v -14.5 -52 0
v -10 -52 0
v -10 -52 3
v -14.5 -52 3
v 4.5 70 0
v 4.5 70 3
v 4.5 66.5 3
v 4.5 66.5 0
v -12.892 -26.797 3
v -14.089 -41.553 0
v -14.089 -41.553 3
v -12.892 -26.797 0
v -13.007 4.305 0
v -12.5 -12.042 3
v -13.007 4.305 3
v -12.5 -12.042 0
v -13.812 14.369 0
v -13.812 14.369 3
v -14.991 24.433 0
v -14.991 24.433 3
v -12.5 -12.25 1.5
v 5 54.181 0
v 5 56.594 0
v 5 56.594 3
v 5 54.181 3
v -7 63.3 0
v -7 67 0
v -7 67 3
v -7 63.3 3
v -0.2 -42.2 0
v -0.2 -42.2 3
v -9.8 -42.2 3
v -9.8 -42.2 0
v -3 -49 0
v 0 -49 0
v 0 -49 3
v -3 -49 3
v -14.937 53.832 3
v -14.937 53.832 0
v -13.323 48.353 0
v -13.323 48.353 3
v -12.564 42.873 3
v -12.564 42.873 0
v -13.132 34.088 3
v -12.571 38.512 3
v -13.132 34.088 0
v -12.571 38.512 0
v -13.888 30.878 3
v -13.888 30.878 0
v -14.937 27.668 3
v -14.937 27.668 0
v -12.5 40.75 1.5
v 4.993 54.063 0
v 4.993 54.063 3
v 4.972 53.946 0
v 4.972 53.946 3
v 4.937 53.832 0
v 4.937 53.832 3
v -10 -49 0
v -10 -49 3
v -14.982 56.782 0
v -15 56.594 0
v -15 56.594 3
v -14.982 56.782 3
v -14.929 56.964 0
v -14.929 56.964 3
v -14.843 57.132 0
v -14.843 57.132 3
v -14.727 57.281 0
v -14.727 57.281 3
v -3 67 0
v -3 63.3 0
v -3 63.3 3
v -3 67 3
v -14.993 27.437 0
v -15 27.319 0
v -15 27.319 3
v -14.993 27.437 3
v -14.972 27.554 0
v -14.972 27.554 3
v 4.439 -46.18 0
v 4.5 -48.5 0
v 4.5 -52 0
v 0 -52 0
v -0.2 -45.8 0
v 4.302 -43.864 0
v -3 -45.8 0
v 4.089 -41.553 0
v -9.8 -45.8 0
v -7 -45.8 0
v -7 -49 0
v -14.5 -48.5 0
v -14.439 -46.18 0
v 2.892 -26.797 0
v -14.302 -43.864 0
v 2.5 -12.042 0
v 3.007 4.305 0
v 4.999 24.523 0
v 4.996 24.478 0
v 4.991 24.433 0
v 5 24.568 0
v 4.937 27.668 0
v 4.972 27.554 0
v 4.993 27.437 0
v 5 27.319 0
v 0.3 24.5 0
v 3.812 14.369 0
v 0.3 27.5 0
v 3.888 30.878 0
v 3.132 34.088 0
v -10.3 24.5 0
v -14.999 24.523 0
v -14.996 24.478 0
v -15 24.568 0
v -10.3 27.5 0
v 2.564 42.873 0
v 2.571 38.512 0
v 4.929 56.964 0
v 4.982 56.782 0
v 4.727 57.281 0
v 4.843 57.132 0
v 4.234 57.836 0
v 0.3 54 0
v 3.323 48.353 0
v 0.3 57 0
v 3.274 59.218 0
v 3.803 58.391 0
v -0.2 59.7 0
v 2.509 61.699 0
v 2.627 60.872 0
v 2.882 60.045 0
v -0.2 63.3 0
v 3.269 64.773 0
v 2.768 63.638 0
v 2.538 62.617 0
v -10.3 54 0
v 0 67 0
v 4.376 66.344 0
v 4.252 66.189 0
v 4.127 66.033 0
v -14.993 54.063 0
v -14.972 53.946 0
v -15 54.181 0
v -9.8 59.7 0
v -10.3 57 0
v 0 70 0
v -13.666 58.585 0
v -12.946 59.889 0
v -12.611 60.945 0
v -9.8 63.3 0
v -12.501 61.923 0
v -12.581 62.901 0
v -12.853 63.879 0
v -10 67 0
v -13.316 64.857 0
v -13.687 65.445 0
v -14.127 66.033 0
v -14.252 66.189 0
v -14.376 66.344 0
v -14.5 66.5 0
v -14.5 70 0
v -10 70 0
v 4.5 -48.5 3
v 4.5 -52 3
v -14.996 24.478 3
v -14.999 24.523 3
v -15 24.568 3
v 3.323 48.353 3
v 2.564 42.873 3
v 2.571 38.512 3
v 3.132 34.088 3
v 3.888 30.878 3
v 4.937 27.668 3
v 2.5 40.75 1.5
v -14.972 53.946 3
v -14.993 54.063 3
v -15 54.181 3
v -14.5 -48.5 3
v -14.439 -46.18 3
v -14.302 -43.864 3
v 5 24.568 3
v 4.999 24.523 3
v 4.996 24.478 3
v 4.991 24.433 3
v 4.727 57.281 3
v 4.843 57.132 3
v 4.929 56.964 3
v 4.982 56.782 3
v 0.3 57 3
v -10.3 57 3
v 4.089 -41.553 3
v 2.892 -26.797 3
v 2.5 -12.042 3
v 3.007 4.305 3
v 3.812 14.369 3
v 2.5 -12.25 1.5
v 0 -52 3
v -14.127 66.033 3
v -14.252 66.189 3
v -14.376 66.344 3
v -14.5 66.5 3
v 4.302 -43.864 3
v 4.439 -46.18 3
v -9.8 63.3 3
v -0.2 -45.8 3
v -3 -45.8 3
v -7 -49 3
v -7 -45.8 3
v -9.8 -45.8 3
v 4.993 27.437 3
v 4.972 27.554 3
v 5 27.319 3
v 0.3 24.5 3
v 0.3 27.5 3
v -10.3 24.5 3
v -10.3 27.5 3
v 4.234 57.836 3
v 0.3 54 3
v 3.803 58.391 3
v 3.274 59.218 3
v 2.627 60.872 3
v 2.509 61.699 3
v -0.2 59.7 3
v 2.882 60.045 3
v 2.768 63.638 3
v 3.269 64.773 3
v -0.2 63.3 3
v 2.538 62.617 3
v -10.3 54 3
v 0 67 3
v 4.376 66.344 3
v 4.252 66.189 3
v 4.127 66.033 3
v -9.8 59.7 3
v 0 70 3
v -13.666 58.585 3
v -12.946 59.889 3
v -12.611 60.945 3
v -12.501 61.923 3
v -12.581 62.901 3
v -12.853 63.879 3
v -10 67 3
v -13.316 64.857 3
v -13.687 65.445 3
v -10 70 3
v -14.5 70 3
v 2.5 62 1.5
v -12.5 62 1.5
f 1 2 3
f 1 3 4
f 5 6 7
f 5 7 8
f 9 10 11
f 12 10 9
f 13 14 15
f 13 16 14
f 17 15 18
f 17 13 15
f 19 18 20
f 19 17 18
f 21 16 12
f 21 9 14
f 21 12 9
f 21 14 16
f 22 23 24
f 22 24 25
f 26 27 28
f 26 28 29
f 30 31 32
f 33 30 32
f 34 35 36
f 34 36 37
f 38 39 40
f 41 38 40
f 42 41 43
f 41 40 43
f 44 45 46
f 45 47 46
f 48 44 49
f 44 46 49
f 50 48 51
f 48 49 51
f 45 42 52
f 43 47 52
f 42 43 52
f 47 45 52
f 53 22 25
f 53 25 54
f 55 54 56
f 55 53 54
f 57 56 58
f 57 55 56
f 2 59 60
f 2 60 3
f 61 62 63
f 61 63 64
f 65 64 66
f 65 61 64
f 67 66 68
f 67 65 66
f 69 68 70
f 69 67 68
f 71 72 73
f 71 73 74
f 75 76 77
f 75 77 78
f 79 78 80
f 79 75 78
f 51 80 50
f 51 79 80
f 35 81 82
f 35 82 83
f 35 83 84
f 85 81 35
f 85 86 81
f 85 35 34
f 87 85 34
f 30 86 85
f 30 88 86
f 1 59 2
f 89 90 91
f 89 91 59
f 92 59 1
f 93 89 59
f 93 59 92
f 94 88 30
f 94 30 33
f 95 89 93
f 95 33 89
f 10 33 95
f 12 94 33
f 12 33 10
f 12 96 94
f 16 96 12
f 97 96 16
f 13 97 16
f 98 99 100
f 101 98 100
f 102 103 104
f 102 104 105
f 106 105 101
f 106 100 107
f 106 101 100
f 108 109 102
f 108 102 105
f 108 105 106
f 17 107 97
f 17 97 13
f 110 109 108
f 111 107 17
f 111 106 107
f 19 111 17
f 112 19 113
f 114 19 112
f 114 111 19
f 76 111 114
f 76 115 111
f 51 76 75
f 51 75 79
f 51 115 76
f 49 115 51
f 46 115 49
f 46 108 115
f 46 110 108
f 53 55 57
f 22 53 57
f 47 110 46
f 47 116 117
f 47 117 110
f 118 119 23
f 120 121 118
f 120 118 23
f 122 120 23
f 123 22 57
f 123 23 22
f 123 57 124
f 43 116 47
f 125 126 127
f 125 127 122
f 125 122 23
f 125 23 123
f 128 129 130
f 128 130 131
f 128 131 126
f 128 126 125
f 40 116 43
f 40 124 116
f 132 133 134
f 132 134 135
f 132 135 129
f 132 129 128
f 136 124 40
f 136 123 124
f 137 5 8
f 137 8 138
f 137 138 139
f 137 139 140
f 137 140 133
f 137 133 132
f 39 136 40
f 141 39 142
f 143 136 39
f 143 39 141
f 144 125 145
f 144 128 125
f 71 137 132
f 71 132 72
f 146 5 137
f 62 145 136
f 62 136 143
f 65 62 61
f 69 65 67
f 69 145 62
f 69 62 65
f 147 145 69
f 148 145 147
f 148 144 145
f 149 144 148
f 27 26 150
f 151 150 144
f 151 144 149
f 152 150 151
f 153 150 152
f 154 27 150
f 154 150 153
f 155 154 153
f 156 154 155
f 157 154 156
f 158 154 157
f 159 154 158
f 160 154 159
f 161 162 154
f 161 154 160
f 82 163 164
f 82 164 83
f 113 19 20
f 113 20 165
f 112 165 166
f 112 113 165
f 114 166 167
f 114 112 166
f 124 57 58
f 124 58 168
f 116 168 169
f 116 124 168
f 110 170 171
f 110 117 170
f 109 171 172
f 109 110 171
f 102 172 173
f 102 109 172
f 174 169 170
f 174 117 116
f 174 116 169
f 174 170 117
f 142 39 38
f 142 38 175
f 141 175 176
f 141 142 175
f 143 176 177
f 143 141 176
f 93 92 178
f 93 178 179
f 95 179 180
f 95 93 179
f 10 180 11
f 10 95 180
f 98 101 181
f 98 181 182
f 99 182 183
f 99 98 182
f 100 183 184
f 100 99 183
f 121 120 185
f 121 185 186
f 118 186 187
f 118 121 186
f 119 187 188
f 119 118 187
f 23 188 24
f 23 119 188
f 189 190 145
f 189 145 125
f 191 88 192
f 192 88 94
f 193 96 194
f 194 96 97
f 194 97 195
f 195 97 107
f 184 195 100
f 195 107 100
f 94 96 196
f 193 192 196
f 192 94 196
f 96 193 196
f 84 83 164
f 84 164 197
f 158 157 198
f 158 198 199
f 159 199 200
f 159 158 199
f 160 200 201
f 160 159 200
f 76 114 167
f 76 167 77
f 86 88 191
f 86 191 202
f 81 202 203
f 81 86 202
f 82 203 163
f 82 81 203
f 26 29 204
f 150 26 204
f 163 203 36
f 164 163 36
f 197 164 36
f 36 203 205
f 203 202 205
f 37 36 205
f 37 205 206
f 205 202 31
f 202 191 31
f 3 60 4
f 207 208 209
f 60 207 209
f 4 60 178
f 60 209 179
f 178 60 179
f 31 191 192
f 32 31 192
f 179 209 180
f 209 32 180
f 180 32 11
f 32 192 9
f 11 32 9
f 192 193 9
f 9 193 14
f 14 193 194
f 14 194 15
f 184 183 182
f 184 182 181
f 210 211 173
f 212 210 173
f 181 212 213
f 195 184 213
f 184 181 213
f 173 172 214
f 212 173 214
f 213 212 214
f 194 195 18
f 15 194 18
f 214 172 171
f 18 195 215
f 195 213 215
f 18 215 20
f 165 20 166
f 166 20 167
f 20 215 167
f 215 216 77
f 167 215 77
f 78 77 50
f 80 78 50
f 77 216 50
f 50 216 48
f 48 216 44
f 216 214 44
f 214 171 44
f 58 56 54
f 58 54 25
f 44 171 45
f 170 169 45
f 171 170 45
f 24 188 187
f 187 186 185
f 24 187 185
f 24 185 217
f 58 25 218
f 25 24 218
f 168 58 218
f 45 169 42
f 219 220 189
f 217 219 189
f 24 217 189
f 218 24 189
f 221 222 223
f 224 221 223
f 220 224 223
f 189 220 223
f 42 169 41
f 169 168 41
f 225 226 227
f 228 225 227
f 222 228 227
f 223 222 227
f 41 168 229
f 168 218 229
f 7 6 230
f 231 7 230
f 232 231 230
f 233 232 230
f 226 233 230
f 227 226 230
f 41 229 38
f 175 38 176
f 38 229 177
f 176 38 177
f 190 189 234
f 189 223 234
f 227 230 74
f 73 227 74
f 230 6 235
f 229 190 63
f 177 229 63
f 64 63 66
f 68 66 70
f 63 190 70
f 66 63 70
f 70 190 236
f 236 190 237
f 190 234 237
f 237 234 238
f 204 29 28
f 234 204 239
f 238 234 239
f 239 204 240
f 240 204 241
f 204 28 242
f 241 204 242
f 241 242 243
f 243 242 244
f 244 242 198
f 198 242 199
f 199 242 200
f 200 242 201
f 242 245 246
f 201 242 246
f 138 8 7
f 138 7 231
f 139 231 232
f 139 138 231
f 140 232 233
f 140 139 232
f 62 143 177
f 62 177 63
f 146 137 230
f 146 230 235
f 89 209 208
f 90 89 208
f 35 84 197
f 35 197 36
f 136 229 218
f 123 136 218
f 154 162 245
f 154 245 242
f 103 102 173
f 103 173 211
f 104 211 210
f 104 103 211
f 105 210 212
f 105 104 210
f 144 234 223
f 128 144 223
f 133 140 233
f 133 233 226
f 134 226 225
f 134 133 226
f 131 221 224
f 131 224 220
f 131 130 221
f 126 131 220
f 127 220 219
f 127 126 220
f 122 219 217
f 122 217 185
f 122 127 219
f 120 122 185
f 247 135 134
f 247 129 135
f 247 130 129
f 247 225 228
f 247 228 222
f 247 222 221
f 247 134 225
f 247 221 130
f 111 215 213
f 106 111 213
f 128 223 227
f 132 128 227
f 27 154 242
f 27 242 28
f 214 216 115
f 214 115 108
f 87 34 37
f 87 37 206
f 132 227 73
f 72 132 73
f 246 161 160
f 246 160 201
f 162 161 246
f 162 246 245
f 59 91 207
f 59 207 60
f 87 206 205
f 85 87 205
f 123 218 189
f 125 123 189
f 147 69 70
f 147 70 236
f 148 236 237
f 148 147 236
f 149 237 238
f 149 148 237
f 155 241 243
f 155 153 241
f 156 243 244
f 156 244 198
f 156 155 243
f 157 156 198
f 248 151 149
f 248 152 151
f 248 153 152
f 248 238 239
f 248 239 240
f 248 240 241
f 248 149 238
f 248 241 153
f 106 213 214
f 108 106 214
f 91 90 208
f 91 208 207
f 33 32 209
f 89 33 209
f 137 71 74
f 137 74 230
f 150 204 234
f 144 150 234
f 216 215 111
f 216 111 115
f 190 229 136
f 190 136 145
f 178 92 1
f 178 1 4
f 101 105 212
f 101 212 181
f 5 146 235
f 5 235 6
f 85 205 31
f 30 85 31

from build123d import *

# Parameters (mm, degrees)
CROQUIS1_W              = 10
CROQUIS1_H              = 3
SALIENTE_EXTRUIR1_DEPTH = 3
CROQUIS2_W              = 0.3
CROQUIS2_H              = 0.3
CROQUIS2_H_2            = 3
CORTAR_EXTRUIR2_DEPTH   = 3
CROQUIS3_W              = 3
CROQUIS3_H              = 3.5
CORTAR_EXTRUIR3_DEPTH   = 0.5
CROQUIS4_W              = 3
CROQUIS4_H              = 3.5
CORTAR_EXTRUIR4_DEPTH   = 0.5
CROQUIS5_W              = 3
CROQUIS5_H              = 3.5
CORTAR_EXTRUIR5_DEPTH   = 0.5
CROQUIS6_W              = 3
CROQUIS6_H              = 3.5
CORTAR_EXTRUIR6_DEPTH   = 0.5
REDONDEO1_START         = -1
REDONDEO1_DEPTH         = 5


with BuildPart() as part:
    # Croquis1 → Saliente-Extruir1 (new body)
    with BuildSketch(Plane.XY):
        with BuildLine():
            Line((-10, 70), (-10, 67))
            Line((-10, 67), (-7, 67))
            Line((-7, 67), (-7, 63))
            Line((-7, 63), (-9.5, 63))
            Line((-9.5, 63), (-9.5, 60))
            Line((-9.5, 60), (-0.5, 60))
            Line((-0.5, 60), (-0.5, 63))
            Line((-0.5, 63), (-3, 63))
            Line((-3, 63), (-3, 67))
            Line((-3, 67), (0, 67))
            Line((0, 67), (0, 70))
            Line((0, 70), (5, 70))
            Line((5, 70), (5, 67.405747627))
            ThreePointArc((5, 67.405747627), (4.929306729, 67.036438809), (4.727221995, 66.719345288))
            add(Edge.make_bspline(
                [(4.727221995, 66.719345288), (3.242407332, 65.146230192), (1.757592668, 62), (3.242407332, 58.853769808), (4.727221995, 57.280654712)],
                knots=[0.028065471, 0.028065471, 0.028065471, 0.028065471, 0.5, 0.971934529, 0.971934529, 0.971934529, 0.971934529], degree=3))
            ThreePointArc((4.727221995, 57.280654712), (4.929306729, 56.963561191), (5, 56.594252373))
            Line((5, 56.594252373), (5, 54.181314171))
            ThreePointArc((5, 54.181314171), (4.9841425, 54.003934523), (4.937072921, 53.832180471))
            add(Edge.make_bspline(
                [(4.937072921, 53.832180471), (3.31235764, 49.471453647), (1.68764236, 40.75), (3.31235764, 32.028546353), (4.937072921, 27.667819529)],
                knots=[0.006332812, 0.006332812, 0.006332812, 0.006332812, 0.5, 0.993667188, 0.993667188, 0.993667188, 0.993667188], degree=3))
            ThreePointArc((4.937072921, 27.667819529), (4.9841425, 27.496065477), (5, 27.318685829))
            Line((5, 27.318685829), (5, 24.567654138))
            ThreePointArc((5, 24.567654138), (4.997723384, 24.500214919), (4.990903903, 24.433082766))
            add(Edge.make_bspline(
                [(4.990903903, -48.933082766), (3.330301301, -36.70538851), (1.669698699, -12.25), (3.330301301, 12.20538851), (4.990903903, 24.433082766)],
                knots=[0.000910439, 0.000910439, 0.000910439, 0.000910439, 0.5, 0.999089561, 0.999089561, 0.999089561, 0.999089561], degree=3))
            ThreePointArc((4.990903903, -48.933082766), (4.997723384, -49.000214919), (5, -49.067654138))
            Line((5, -49.067654138), (5, -51.701381229))
            Line((5, -51.701381229), (5, -52))
            Line((5, -52), (0, -52))
            Line((0, -52), (0, -49))
            Line((0, -49), (-3, -49))
            Line((-3, -49), (-3, -45.5))
            Line((-3, -45.5), (-0.5, -45.5))
            Line((-0.5, -45.5), (-0.5, -42.5))
            Line((-0.5, -42.5), (-9.5, -42.5))
            Line((-9.5, -42.5), (-9.5, -45.5))
            Line((-9.5, -45.5), (-7, -45.5))
            Line((-7, -45.5), (-7, -49))
            Line((-7, -49), (-10, -49))
            Line((-10, -49), (-10, -52))
            Line((-10, -52), (-15, -52))
            Line((-15, -52), (-15, -51.701381229))
            Line((-15, -51.701381229), (-15, -49.067654138))
            ThreePointArc((-15, -49.067654138), (-14.997723384, -49.000214919), (-14.990903903, -48.933082766))
            add(Edge.make_bspline(
                [(-14.990903903, -48.933082766), (-13.330301301, -36.70538851), (-11.669698699, -12.25), (-13.330301301, 12.20538851), (-14.990903903, 24.433082766)],
                knots=[0.000910439, 0.000910439, 0.000910439, 0.000910439, 0.5, 0.999089561, 0.999089561, 0.999089561, 0.999089561], degree=3))
            ThreePointArc((-14.990903903, 24.433082766), (-14.997723384, 24.500214919), (-15, 24.567654138))
            Line((-15, 24.567654138), (-15, 27.318685829))
            ThreePointArc((-15, 27.318685829), (-14.9841425, 27.496065477), (-14.937072921, 27.667819529))
            add(Edge.make_bspline(
                [(-14.937072921, 53.832180471), (-13.31235764, 49.471453647), (-11.68764236, 40.75), (-13.31235764, 32.028546353), (-14.937072921, 27.667819529)],
                knots=[0.006332812, 0.006332812, 0.006332812, 0.006332812, 0.5, 0.993667188, 0.993667188, 0.993667188, 0.993667188], degree=3))
            ThreePointArc((-14.937072921, 53.832180471), (-14.9841425, 54.003934523), (-15, 54.181314171))
            Line((-15, 54.181314171), (-15, 56.594252373))
            ThreePointArc((-15, 56.594252373), (-14.929306729, 56.963561191), (-14.727221995, 57.280654712))
            add(Edge.make_bspline(
                [(-14.727221995, 57.280654712), (-13.242407332, 58.853769808), (-11.757592668, 62), (-13.242407332, 65.146230192), (-14.727221995, 66.719345288)],
                knots=[0.028065471, 0.028065471, 0.028065471, 0.028065471, 0.5, 0.971934529, 0.971934529, 0.971934529, 0.971934529], degree=3))
            ThreePointArc((-14.727221995, 66.719345288), (-14.929306729, 67.036438809), (-15, 67.405747627))
            Line((-15, 67.405747627), (-15, 70))
            Line((-15, 70), (-10, 70))
        make_face()
        with Locations((-5, 26)):
            Rectangle(CROQUIS1_W, CROQUIS1_H, mode=Mode.SUBTRACT)
        with Locations((-5, 55.5)):
            Rectangle(CROQUIS1_W, CROQUIS1_H, mode=Mode.SUBTRACT)
    extrude(amount=SALIENTE_EXTRUIR1_DEPTH)

    # Croquis2 → Cortar-Extruir2 (cut)
    with BuildSketch(Plane.XY.offset(3)):
        Polygon((-9.8, -45.5), (-9.8, -45.8), (-9.5, -45.8), (-7, -45.8), (-7, -45.5), (-9.5, -45.5), (-9.5, -42.5), (-0.5, -42.5), (-0.5, -42.2), (-9.5, -42.2), (-9.8, -42.2), (-9.8, -42.5), align=None)
        Polygon((-0.5, -45.8), (-0.2, -45.8), (-0.2, -45.5), (-0.2, -42.5), (-0.5, -42.5), (-0.5, -45.5), (-3, -45.5), (-3, -45.8), align=None)
        with Locations((-0.35, -42.35)):
            Rectangle(CROQUIS2_W, CROQUIS2_H)
        with Locations((-10.15, 26)):
            Rectangle(CROQUIS2_W, CROQUIS2_H_2)
        with Locations((0.15, 26)):
            Rectangle(CROQUIS2_W, CROQUIS2_H_2)
        with Locations((0.15, 55.5)):
            Rectangle(CROQUIS2_W, CROQUIS2_H_2)
        with Locations((-10.15, 55.5)):
            Rectangle(CROQUIS2_W, CROQUIS2_H_2)
        Polygon((-9.8, 63.3), (-9.5, 63.3), (-7, 63.3), (-7, 63), (-9.5, 63), (-9.5, 60), (-0.5, 60), (-0.5, 63), (-3, 63), (-3, 63.3), (-0.5, 63.3), (-0.2, 63.3), (-0.2, 63), (-0.2, 60), (-0.2, 59.7), (-0.5, 59.7), (-9.5, 59.7), (-9.8, 59.7), (-9.8, 60), (-9.8, 63), align=None)
    extrude(amount=-CORTAR_EXTRUIR2_DEPTH, mode=Mode.SUBTRACT)

    # Croquis3 → Cortar-Extruir3 (cut)
    with BuildSketch(Plane.ZY.offset(15)):
        with Locations((1.5, -50.25)):
            Rectangle(CROQUIS3_W, CROQUIS3_H)
    extrude(amount=-CORTAR_EXTRUIR3_DEPTH, mode=Mode.SUBTRACT)

    # Croquis4 → Cortar-Extruir4 (cut)
    with BuildSketch(Plane(origin=(5, 0, 0), x_dir=(0, 0, -1), z_dir=(1, 0, 0))):
        with Locations((-1.5, -50.25)):
            Rectangle(CROQUIS4_W, CROQUIS4_H)
    extrude(amount=-CORTAR_EXTRUIR4_DEPTH, mode=Mode.SUBTRACT)

    # Croquis5 → Cortar-Extruir5 (cut)
    with BuildSketch(Plane.ZY.offset(15)):
        with Locations((1.5, 68.25)):
            Rectangle(CROQUIS5_W, CROQUIS5_H)
    extrude(amount=-CORTAR_EXTRUIR5_DEPTH, mode=Mode.SUBTRACT)

    # Croquis6 → Cortar-Extruir6 (cut)
    with BuildSketch(Plane(origin=(5, 0, 0), x_dir=(0, 0, -1), z_dir=(1, 0, 0))):
        with Locations((-1.5, 68.25)):
            Rectangle(CROQUIS6_W, CROQUIS6_H)
    extrude(amount=-CORTAR_EXTRUIR6_DEPTH, mode=Mode.SUBTRACT)

    # Redondeo1: read off the stored shape, not the designer's step
    # Redondeo1 outline → Redondeo1 (cut)
    with BuildSketch(Plane.XY.offset(REDONDEO1_START)):
        with BuildLine():
            Line((-14.932435559, -48.5), (-14.5, -48.5))
            ThreePointArc((-14.5, -48.5), (-14.379883961, -45.021273255), (-14.08941772, -41.552614006))
            add(Edge.make_bspline(
                [(-14.932435559, -48.5), (-14.621648088, -46.184204669), (-14.340642142, -43.868409337), (-14.08941772, -41.552614006)],
                knots=[0.006802721, 0.006802721, 0.006802721, 0.006802721, 0.10132498, 0.10132498, 0.10132498, 0.10132498], degree=3))
        make_face()
        with BuildLine():
            add(Edge.make_bspline(
                [(4.932435559, -48.5), (4.621648088, -46.184204669), (4.340642142, -43.868409337), (4.08941772, -41.552614006)],
                knots=[0.006802721, 0.006802721, 0.006802721, 0.006802721, 0.10132498, 0.10132498, 0.10132498, 0.10132498], degree=3))
            ThreePointArc((4.08941772, -41.552614006), (4.379883961, -45.021273255), (4.5, -48.5))
            Line((4.5, -48.5), (4.932435559, -48.5))
        make_face()
        with BuildLine():
            Line((4.525, 66.5), (4.5, 66.5))
            ThreePointArc((4.5, 66.5), (4.313911858, 66.266314057), (4.126842149, 66.033413132))
            add(Edge.make_bspline(
                [(4.525, 66.5), (4.38502394, 66.344471044), (4.252304656, 66.188942088), (4.126842149, 66.033413132)],
                knots=[0.05, 0.05, 0.05, 0.05, 0.096658687, 0.096658687, 0.096658687, 0.096658687], degree=3))
        make_face()
        with BuildLine():
            add(Edge.make_bspline(
                [(-14.126842149, 66.033413132), (-14.252304656, 66.188942088), (-14.38502394, 66.344471044), (-14.525, 66.5)],
                knots=[0.903341313, 0.903341313, 0.903341313, 0.903341313, 0.95, 0.95, 0.95, 0.95], degree=3))
            ThreePointArc((-14.126842149, 66.033413132), (-14.313911858, 66.266314057), (-14.5, 66.5))
            Line((-14.5, 66.5), (-14.525, 66.5))
        make_face()
    extrude(amount=REDONDEO1_DEPTH, mode=Mode.SUBTRACT)


solid = part.part
